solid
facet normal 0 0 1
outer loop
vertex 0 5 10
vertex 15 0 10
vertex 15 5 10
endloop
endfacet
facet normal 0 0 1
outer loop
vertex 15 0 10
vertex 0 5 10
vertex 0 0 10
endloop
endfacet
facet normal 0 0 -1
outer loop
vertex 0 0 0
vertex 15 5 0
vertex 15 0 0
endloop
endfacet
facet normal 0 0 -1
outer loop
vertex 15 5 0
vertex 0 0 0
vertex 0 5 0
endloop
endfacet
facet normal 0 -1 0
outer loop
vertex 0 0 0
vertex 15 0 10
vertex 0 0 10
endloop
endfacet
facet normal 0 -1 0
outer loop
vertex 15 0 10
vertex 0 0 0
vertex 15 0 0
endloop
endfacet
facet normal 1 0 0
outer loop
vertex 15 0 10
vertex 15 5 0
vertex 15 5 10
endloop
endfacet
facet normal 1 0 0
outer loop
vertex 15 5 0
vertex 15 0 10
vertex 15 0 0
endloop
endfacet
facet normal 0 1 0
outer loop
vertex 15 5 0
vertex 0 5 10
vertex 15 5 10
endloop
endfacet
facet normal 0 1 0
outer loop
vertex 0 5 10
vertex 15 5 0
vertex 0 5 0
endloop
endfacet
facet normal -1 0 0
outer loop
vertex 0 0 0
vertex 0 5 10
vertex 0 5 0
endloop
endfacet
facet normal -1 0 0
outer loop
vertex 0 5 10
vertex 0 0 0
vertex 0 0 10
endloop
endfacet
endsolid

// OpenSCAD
// Generated by generate_scads.py
cube(size=[15,5,10], center=false);
